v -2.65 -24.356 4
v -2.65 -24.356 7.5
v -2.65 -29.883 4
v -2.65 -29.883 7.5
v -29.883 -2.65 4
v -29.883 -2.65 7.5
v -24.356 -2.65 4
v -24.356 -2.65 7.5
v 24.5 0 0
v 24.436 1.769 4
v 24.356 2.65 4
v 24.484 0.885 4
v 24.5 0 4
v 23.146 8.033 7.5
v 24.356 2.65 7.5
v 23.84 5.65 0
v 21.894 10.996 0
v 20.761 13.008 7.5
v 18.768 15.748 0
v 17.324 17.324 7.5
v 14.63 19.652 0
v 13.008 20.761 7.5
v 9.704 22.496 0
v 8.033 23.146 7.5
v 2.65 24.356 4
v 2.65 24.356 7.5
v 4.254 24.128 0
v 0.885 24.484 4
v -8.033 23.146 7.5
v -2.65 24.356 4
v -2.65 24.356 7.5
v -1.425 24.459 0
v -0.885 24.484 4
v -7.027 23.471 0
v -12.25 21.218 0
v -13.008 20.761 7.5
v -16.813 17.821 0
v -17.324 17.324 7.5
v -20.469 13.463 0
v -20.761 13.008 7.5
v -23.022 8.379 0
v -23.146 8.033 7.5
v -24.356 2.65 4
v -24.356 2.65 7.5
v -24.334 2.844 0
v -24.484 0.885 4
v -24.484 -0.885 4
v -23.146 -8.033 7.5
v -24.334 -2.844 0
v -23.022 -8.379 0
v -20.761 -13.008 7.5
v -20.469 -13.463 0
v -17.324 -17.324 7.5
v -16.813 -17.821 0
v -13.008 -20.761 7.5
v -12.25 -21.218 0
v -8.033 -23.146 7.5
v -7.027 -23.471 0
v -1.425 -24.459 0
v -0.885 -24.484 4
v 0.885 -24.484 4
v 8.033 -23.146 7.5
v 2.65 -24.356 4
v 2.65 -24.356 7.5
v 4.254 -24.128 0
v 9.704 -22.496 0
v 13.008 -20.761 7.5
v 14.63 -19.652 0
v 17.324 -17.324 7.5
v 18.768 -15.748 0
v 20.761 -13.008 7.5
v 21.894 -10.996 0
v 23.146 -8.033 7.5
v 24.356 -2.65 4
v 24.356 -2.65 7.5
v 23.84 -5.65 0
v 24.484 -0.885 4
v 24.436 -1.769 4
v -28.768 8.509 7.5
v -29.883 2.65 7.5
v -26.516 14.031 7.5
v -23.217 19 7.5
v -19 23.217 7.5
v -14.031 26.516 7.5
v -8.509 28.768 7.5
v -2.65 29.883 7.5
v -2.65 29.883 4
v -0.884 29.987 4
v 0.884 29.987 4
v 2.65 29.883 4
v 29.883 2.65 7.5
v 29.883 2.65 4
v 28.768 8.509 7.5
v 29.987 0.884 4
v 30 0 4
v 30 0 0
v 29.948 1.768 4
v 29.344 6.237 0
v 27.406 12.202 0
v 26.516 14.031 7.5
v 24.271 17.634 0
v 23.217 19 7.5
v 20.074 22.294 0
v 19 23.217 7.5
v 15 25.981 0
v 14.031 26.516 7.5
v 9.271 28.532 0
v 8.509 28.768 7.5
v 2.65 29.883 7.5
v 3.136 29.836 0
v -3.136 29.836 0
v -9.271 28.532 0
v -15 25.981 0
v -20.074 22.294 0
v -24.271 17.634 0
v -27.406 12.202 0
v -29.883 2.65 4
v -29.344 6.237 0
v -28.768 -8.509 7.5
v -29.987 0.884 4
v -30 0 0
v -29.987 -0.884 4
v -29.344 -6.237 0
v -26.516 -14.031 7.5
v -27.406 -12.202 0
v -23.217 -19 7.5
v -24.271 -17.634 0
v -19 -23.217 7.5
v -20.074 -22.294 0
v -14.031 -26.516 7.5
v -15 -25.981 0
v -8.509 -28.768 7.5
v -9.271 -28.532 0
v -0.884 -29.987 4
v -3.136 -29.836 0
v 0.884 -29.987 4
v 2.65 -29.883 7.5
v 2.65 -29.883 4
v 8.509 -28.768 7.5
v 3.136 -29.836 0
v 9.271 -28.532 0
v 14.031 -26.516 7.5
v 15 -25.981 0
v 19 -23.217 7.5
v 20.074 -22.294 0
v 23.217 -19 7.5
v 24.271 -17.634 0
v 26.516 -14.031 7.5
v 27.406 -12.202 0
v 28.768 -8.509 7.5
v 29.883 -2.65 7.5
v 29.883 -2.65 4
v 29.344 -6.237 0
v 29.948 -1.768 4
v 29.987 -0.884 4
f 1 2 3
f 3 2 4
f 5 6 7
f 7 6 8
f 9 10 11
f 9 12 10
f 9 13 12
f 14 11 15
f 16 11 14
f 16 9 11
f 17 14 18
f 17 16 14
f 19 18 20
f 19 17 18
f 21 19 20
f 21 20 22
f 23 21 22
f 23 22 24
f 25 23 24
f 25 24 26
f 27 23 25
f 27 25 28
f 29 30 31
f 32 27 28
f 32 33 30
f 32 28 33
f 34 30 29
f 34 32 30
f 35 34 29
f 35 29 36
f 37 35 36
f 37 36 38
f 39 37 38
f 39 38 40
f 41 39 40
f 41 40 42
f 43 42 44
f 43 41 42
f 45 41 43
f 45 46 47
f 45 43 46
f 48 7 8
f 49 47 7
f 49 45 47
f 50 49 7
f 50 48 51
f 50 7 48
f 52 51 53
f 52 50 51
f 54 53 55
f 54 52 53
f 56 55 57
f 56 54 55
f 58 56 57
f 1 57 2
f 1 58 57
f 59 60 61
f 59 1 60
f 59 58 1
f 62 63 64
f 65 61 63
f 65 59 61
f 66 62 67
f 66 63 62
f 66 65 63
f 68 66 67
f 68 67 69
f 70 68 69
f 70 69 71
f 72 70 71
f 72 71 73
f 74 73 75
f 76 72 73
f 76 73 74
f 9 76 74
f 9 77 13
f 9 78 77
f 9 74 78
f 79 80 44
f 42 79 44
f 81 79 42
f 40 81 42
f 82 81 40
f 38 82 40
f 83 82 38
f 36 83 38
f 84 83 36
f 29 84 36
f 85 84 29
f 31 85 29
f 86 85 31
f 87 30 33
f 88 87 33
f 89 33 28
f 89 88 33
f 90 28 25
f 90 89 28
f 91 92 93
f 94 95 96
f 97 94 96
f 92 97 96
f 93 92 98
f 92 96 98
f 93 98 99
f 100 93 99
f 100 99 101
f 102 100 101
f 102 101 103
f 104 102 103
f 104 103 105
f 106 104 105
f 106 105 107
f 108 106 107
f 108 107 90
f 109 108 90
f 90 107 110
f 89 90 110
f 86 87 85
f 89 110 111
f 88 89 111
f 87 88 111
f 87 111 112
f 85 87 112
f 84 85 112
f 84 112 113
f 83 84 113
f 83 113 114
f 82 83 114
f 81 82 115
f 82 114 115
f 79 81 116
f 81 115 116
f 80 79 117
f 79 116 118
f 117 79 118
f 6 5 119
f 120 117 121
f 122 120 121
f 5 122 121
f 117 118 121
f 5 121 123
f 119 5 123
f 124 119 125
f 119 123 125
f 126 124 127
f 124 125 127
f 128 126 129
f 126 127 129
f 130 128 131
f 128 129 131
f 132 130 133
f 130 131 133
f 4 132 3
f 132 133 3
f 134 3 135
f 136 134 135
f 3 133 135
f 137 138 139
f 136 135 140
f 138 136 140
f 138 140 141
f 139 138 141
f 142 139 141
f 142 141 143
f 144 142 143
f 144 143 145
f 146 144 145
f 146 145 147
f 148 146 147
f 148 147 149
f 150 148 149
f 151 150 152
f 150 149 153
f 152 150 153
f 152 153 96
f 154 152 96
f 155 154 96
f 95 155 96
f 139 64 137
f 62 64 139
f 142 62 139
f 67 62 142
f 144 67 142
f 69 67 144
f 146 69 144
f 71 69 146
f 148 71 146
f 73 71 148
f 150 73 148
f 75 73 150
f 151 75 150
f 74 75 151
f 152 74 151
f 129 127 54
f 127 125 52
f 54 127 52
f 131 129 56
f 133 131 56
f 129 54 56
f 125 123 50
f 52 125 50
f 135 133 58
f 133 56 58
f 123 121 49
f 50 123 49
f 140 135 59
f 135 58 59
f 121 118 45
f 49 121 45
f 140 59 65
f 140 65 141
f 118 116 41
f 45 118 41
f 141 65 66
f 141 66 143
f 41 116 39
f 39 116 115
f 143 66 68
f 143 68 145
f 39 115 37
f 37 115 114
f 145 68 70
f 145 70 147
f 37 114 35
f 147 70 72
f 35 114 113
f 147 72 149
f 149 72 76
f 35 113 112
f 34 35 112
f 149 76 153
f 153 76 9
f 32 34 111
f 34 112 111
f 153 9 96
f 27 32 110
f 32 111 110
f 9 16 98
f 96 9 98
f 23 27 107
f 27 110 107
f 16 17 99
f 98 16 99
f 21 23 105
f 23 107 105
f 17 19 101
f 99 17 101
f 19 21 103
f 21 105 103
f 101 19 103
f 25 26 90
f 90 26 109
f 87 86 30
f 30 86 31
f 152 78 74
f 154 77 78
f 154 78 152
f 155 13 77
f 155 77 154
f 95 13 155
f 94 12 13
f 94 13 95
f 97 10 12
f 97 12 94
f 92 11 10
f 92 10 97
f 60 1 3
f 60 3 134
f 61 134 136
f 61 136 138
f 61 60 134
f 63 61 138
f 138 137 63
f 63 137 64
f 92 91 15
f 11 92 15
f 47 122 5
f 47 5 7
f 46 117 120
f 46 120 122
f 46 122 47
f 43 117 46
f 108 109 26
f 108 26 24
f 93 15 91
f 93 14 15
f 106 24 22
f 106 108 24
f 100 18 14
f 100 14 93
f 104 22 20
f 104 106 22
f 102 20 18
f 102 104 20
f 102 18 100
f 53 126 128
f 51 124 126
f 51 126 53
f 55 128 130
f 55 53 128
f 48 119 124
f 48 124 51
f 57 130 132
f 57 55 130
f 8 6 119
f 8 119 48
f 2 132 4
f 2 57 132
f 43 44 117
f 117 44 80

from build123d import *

# Parameters (mm, degrees)
F0_R     = 30
F0_R_2   = 24.5
F1_DEPTH = 7.5
F3_DEPTH = 3.5


with BuildPart() as f1:
    # F0 (on Top) → F1 (new body)
    with BuildSketch(Plane.XY):
        Circle(F0_R)
        Circle(F0_R_2, mode=Mode.SUBTRACT)
    extrude(amount=F1_DEPTH)

    # F2 (on face) → F3 (cut)
    with BuildSketch(Plane.XY.offset(7.5)):
        with BuildLine():
            Line((-2.65, -24.3562620285), (-2.65, -29.8827291257))
            ThreePointArc((-2.65, -29.8827291257), (0, -30), (2.65, -29.8827291257))
            Line((2.65, -29.8827291257), (2.65, -24.3562620285))
            ThreePointArc((2.65, -24.3562620285), (0, -24.5), (-2.65, -24.3562620285))
        make_face()
        with BuildLine():
            ThreePointArc((30, 0), (29.9706679419, 1.3262967671), (29.8827291257, 2.65))
            Line((29.8827291257, 2.65), (24.3562620285, 2.65))
            ThreePointArc((24.3562620285, 2.65), (24.4640391156, 1.3269476821), (24.5, 0))
            ThreePointArc((24.5, 0), (24.4640391156, -1.3269476821), (24.3562620285, -2.65))
            Line((24.3562620285, -2.65), (29.8827291257, -2.65))
            ThreePointArc((29.8827291257, -2.65), (29.9706679419, -1.3262967671), (30, 0))
        make_face()
        with BuildLine():
            ThreePointArc((2.65, 29.8827291257), (0, 30), (-2.65, 29.8827291257))
            Line((-2.65, 29.8827291257), (-2.65, 24.3562620285))
            ThreePointArc((-2.65, 24.3562620285), (0, 24.5), (2.65, 24.3562620285))
            Line((2.65, 24.3562620285), (2.65, 29.8827291257))
        make_face()
        with BuildLine():
            Line((-24.3562620285, 2.65), (-29.8827291257, 2.65))
            ThreePointArc((-29.8827291257, 2.65), (-30, 0), (-29.8827291257, -2.65))
            Line((-29.8827291257, -2.65), (-24.3562620285, -2.65))
            ThreePointArc((-24.3562620285, -2.65), (-24.5, 0), (-24.3562620285, 2.65))
        make_face()
    extrude(amount=-F3_DEPTH, mode=Mode.SUBTRACT)


solid = f1.part
